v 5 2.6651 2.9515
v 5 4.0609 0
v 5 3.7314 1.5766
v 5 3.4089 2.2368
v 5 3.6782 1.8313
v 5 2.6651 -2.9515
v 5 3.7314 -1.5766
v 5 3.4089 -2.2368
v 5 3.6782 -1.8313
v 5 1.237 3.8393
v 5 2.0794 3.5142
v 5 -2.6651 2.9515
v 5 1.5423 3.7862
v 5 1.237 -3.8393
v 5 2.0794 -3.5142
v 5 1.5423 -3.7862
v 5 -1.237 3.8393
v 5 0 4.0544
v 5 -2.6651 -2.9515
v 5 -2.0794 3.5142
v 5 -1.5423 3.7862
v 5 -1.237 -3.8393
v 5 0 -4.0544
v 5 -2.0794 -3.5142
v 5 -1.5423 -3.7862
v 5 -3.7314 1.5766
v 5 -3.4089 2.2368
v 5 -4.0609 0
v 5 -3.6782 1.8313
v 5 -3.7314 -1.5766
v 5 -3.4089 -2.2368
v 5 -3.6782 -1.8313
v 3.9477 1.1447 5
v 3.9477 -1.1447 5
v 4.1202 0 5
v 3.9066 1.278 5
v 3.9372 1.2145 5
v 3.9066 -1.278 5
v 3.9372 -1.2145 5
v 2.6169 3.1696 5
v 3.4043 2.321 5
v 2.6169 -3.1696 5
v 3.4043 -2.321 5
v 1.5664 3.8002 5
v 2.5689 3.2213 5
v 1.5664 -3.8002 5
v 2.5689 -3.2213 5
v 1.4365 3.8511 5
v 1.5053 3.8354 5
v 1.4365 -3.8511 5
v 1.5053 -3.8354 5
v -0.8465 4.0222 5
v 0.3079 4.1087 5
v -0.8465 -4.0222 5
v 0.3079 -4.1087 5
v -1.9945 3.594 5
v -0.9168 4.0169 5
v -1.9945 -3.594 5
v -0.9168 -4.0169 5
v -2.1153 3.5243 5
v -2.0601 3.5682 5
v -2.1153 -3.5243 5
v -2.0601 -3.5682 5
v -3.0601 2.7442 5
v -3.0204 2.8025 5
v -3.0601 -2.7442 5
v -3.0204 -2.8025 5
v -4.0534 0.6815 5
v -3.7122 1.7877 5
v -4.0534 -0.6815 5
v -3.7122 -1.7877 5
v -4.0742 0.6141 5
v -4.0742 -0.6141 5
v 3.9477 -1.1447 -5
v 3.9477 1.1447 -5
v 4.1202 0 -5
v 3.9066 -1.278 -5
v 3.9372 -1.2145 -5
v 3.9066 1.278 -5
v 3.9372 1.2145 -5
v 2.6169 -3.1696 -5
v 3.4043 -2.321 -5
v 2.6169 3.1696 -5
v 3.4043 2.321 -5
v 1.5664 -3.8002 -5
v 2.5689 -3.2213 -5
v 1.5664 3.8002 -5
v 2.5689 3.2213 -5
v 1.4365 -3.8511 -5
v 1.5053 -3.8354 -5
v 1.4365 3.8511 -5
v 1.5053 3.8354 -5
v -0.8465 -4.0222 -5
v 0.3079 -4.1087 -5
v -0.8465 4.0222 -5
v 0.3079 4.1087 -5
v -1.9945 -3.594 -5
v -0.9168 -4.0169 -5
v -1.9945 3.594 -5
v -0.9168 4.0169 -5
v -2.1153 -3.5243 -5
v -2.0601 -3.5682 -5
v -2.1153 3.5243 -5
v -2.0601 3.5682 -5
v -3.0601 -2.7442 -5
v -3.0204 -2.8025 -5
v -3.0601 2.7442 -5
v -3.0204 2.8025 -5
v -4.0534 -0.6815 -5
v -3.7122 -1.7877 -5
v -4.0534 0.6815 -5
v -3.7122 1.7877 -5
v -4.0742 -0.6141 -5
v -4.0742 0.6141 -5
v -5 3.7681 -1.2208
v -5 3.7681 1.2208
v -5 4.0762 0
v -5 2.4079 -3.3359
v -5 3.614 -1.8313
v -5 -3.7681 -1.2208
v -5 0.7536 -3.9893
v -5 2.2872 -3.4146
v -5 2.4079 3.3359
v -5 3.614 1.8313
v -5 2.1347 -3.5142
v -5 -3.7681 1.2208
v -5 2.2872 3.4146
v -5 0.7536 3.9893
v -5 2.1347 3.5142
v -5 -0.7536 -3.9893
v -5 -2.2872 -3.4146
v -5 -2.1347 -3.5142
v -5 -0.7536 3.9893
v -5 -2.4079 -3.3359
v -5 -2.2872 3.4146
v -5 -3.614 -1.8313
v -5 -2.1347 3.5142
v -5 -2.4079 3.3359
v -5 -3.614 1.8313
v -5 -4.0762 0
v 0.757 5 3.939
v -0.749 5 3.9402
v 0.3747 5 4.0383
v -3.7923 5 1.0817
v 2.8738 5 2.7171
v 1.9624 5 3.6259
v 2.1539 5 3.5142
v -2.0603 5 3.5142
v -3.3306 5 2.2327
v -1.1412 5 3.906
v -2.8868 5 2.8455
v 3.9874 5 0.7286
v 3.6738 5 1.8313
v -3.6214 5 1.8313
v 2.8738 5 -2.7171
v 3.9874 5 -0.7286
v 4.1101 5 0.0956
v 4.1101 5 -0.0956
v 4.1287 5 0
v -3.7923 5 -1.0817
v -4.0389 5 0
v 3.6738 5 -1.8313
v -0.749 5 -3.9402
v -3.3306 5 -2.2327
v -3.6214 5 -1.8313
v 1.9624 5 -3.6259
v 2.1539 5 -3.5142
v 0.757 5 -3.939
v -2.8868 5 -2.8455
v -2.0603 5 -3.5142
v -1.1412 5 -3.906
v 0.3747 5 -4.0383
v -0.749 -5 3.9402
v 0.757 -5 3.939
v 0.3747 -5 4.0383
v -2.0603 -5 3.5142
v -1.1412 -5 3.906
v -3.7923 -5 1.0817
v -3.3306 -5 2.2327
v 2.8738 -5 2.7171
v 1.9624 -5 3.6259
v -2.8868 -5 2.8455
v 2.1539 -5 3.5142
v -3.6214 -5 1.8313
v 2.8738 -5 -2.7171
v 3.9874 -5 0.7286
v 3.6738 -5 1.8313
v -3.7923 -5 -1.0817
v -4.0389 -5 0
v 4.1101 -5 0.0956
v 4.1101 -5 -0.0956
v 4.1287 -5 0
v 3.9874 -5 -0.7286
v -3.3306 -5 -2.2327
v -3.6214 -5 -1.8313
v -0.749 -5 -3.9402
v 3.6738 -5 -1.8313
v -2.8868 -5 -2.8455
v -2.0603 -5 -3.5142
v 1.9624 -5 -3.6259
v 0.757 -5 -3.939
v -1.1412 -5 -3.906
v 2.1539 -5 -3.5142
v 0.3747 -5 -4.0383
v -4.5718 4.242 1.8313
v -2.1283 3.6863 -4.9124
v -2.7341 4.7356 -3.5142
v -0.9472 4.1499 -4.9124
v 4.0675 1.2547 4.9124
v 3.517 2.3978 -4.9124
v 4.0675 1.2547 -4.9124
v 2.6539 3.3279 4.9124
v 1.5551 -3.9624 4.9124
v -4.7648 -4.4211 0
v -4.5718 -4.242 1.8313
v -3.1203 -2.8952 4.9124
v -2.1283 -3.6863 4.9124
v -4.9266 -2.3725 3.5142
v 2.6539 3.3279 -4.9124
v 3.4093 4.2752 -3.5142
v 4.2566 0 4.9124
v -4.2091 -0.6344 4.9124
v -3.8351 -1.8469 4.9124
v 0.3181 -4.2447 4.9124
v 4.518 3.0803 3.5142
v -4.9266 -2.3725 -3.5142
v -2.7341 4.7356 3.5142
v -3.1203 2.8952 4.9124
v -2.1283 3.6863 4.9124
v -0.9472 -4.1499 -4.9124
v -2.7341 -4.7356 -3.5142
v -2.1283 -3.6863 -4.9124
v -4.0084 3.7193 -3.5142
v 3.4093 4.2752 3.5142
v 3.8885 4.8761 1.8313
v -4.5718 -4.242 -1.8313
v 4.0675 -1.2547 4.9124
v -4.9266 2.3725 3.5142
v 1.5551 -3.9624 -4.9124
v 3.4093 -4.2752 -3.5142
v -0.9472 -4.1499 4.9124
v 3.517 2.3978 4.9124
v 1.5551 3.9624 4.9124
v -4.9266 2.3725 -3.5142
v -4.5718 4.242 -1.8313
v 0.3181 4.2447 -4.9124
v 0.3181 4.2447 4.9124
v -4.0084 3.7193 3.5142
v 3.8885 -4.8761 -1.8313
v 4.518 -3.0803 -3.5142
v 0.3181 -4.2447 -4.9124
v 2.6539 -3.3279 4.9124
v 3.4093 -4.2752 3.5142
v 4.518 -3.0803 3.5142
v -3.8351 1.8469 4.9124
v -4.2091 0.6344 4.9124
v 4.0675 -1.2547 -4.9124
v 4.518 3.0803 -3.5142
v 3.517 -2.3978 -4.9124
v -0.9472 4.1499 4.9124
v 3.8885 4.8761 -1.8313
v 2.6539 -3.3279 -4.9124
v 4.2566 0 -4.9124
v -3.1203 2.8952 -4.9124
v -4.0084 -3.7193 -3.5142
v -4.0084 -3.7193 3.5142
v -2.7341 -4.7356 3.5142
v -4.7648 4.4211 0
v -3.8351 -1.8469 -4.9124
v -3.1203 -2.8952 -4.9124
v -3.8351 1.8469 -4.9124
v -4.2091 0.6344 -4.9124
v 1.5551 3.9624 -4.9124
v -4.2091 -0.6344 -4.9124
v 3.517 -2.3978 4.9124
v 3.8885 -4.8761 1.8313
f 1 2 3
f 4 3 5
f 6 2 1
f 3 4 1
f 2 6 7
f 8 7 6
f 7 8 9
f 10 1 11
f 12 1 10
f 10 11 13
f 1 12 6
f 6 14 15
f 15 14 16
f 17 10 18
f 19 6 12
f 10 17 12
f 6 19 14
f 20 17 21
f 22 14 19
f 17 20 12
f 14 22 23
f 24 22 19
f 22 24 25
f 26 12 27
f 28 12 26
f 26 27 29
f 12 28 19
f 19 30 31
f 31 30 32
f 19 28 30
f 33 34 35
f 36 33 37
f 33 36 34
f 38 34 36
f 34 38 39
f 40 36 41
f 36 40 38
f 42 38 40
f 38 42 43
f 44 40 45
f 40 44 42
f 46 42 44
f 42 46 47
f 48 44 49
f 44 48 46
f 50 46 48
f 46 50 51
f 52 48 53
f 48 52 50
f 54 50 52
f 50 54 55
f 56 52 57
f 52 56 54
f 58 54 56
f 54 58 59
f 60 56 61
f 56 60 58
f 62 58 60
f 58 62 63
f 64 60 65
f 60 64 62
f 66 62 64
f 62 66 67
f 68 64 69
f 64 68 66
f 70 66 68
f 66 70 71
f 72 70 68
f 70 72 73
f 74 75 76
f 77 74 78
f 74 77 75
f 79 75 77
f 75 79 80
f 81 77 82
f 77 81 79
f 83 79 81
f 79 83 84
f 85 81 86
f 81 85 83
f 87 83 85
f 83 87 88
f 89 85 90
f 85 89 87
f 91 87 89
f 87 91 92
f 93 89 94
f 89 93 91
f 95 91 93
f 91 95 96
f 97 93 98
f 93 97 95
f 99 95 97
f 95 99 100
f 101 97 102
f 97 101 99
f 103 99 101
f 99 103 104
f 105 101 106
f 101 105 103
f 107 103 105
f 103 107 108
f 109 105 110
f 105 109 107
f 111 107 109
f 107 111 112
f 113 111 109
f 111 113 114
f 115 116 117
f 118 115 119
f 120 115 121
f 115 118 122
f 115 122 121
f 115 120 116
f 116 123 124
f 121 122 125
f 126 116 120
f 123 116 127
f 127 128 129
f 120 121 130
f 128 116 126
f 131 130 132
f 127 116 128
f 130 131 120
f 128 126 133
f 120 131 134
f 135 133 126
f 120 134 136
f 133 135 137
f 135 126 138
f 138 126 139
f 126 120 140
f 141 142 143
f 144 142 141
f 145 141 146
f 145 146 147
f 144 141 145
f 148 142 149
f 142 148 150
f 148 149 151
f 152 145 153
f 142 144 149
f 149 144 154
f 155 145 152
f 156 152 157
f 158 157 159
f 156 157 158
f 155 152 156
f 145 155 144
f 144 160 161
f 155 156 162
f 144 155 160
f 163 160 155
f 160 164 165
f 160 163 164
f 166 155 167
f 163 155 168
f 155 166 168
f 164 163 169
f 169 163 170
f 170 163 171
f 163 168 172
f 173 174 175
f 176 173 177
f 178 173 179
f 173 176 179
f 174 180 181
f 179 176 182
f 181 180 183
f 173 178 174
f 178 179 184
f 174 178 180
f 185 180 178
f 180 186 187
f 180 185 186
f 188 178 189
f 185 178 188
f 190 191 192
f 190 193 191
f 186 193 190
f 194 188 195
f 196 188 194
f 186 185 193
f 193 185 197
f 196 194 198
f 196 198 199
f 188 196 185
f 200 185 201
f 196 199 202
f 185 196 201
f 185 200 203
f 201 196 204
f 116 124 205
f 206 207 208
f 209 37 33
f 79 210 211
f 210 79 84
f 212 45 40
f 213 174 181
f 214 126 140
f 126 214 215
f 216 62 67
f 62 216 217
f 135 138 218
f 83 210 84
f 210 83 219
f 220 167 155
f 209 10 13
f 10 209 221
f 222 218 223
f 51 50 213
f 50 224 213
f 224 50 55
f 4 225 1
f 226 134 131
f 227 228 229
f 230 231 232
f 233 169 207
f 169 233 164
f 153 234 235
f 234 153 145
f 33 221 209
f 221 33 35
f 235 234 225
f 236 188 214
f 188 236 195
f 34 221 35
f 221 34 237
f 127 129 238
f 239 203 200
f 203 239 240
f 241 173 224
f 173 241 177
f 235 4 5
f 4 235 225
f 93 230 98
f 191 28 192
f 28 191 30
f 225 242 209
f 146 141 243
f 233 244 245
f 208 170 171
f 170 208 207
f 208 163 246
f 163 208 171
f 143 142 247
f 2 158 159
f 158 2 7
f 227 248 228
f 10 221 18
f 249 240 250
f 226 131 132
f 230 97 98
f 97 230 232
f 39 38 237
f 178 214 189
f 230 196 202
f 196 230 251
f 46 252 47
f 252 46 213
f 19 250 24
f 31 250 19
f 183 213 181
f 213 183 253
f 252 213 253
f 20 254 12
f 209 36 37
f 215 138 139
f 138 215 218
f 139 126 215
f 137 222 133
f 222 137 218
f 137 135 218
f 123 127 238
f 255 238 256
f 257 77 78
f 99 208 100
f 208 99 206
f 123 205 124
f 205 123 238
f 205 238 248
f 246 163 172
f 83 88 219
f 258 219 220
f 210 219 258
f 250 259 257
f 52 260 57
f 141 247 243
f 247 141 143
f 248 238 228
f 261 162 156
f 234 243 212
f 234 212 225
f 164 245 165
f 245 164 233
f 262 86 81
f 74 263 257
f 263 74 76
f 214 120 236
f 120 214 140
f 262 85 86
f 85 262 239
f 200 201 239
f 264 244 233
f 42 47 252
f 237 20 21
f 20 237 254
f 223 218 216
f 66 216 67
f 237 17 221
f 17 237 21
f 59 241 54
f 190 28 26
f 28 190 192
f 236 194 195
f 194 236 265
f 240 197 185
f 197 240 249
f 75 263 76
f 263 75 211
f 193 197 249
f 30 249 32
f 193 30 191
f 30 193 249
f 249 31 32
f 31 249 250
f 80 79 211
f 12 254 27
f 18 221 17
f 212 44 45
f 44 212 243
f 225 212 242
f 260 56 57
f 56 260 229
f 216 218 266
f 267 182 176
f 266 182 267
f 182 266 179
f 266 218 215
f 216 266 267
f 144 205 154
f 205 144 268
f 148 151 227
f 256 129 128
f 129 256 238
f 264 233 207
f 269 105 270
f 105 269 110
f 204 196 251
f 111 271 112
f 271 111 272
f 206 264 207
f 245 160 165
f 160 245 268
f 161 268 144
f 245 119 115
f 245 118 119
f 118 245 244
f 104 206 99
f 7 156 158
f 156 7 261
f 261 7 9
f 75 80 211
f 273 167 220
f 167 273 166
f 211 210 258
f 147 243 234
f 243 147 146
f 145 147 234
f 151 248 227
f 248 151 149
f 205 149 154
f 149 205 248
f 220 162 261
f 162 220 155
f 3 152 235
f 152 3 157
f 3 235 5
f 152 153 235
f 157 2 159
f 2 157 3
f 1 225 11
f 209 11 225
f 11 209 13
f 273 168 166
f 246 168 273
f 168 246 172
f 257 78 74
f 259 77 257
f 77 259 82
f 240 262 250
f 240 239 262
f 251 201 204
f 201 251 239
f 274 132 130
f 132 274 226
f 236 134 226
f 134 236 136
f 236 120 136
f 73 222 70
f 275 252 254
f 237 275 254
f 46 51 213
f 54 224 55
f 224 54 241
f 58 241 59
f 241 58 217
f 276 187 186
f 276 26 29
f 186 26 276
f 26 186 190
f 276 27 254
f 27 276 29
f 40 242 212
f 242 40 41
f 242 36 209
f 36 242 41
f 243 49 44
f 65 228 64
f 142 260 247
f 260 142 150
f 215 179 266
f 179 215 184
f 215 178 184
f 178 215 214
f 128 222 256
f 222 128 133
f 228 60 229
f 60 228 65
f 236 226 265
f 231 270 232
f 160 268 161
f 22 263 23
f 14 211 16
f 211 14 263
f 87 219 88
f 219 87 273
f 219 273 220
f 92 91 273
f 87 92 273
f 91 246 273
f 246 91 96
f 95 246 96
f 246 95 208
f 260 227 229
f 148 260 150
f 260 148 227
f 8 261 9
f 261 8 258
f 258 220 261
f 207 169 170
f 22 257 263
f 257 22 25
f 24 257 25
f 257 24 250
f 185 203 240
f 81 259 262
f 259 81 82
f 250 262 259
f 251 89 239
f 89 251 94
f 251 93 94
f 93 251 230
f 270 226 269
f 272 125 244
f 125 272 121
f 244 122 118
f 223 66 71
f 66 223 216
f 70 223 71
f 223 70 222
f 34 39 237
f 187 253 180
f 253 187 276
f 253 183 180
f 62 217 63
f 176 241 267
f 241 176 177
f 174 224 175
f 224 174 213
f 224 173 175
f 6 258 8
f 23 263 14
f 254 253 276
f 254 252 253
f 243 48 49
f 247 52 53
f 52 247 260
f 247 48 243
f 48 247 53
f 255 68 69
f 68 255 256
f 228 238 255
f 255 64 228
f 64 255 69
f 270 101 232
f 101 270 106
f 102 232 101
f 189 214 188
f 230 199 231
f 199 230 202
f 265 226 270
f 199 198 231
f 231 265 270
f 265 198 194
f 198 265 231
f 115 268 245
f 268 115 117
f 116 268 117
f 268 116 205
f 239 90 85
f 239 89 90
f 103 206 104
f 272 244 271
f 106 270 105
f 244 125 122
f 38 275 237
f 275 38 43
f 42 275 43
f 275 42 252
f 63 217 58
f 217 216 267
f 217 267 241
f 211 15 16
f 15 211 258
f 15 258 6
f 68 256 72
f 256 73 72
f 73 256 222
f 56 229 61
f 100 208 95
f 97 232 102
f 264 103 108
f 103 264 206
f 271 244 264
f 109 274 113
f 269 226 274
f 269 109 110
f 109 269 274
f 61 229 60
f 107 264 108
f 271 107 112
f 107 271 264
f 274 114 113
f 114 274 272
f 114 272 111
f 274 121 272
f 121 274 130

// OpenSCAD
intersection() { color("red") cube(10, center=true); color("blue") sphere(6.5); }
